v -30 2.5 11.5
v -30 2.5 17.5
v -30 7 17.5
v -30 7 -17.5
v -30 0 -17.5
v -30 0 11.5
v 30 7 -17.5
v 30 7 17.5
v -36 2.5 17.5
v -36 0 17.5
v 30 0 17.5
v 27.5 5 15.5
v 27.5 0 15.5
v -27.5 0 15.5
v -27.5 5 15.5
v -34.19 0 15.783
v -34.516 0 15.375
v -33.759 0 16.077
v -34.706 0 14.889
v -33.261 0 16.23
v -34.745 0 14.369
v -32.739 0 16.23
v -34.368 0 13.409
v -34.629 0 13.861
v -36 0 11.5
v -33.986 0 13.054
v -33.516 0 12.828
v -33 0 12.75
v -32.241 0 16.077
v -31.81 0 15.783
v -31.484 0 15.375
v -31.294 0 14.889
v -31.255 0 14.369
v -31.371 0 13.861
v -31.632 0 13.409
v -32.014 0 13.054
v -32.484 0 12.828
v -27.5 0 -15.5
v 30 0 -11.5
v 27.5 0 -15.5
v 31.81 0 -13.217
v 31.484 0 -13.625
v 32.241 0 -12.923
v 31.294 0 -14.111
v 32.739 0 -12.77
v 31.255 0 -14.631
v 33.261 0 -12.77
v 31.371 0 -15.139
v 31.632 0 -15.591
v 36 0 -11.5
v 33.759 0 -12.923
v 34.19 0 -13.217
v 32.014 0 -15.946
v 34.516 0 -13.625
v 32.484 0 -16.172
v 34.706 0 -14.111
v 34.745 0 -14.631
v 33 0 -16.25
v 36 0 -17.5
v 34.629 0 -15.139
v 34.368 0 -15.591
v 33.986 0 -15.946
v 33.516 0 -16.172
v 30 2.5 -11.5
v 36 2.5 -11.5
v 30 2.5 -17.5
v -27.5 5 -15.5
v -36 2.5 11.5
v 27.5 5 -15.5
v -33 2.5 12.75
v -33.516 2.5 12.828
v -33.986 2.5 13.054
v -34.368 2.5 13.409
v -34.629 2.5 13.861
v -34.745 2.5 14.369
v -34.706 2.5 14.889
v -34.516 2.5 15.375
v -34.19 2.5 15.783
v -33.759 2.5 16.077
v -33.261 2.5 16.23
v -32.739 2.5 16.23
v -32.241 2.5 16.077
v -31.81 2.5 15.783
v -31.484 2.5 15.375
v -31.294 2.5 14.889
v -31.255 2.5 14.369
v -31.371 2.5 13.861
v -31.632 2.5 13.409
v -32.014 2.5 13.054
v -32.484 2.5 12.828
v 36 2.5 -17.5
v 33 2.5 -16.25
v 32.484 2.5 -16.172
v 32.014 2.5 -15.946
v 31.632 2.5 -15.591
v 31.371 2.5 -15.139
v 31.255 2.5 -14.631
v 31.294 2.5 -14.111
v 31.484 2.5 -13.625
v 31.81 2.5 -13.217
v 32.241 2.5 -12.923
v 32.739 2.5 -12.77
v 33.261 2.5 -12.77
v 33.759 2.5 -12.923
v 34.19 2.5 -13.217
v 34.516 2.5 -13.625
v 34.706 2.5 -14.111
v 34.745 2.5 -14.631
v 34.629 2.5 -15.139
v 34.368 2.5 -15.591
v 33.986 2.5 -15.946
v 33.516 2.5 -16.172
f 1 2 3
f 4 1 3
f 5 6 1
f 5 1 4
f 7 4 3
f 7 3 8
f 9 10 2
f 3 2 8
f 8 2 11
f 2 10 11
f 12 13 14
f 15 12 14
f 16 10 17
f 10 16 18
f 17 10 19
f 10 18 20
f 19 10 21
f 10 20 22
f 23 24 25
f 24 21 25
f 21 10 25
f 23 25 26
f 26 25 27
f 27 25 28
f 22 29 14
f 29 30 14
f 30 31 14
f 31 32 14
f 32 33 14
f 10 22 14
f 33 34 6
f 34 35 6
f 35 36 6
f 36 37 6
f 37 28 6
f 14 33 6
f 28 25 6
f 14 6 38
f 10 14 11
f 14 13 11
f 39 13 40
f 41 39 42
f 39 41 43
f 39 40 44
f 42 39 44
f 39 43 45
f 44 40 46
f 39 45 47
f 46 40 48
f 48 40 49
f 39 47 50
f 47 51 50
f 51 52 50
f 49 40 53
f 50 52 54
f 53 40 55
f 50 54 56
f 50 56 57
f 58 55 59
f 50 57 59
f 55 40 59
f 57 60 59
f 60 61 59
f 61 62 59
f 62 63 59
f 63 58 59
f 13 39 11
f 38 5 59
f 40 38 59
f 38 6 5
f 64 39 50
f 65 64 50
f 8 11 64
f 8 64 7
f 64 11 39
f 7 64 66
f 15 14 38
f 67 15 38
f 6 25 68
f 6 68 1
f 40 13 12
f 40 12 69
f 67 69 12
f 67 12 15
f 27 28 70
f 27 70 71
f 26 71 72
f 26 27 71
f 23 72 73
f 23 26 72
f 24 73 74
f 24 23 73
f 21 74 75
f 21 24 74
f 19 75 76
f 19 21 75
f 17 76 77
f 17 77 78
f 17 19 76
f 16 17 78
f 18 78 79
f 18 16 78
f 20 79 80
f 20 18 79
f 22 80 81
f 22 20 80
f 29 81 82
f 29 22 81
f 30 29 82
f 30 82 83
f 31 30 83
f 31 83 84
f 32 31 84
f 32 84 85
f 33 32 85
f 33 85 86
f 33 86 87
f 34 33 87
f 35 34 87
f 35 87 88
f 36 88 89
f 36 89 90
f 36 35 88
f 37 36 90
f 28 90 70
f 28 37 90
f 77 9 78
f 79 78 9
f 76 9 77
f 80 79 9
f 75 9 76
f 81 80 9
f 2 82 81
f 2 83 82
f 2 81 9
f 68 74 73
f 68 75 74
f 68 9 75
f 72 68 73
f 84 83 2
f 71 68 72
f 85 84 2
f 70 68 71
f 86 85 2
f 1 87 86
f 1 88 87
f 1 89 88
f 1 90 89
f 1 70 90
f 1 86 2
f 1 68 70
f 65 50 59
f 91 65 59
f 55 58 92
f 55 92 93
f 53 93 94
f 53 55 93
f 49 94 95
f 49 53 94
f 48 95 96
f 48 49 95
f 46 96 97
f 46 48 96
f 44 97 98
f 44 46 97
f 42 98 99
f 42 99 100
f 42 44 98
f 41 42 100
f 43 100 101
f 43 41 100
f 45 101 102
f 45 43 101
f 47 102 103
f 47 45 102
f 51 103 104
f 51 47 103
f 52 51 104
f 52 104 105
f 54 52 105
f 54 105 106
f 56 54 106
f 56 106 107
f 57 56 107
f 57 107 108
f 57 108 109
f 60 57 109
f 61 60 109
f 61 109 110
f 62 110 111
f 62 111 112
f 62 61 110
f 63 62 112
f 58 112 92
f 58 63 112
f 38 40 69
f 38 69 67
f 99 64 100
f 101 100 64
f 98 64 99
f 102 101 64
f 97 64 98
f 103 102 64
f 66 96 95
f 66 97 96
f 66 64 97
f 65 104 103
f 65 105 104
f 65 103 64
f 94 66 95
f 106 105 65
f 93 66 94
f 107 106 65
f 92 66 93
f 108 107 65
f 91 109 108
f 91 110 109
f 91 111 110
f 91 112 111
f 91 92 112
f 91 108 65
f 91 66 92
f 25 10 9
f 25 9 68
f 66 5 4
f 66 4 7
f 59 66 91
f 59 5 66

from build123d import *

# Parameters (mm, degrees)
SKETCH1_W           = 60
SKETCH1_H           = 35
BOSS_EXTRUDE1_DEPTH = 7
SKETCH3_W           = 6
SKETCH3_H           = 6
SKETCH3_R           = 1.75
BOSS_EXTRUDE2_DEPTH = 2.5
SKETCH4_W           = 55
SKETCH4_H           = 31
CUT_EXTRUDE1_DEPTH  = 5


with BuildPart() as part:
    # Sketch1 → Boss-Extrude1 (new body)
    with BuildSketch(Plane(origin=(0, 0, 0), x_dir=(1, 0, 0), z_dir=(0, 1, 0))):
        Rectangle(SKETCH1_W, SKETCH1_H)
    extrude(amount=BOSS_EXTRUDE1_DEPTH)

    # Sketch3 → Boss-Extrude2 (add)
    with BuildSketch(Plane(origin=(0, 0, 0), x_dir=(1, 0, 0), z_dir=(0, 1, 0))):
        with Locations((-33, -14.5)):
            Rectangle(SKETCH3_W, SKETCH3_H)
        with Locations(Location((-33, -14.5, 0), (0, 0, 90))):  # turned: the seam where the file's is
            Circle(SKETCH3_R, mode=Mode.SUBTRACT)
        with Locations((33, 14.5)):
            Rectangle(SKETCH3_W, SKETCH3_H)
        with Locations(Location((33, 14.5, 0), (0, 0, 90))):  # turned: the seam where the file's is
            Circle(SKETCH3_R, mode=Mode.SUBTRACT)
    extrude(amount=BOSS_EXTRUDE2_DEPTH)

    # Sketch4 → Cut-Extrude1 (cut)
    with BuildSketch(Plane(origin=(0, 0, 0), x_dir=(-1, 0, 0), z_dir=(0, -1, 0))):
        Rectangle(SKETCH4_W, SKETCH4_H)
    extrude(amount=-CUT_EXTRUDE1_DEPTH, mode=Mode.SUBTRACT)


solid = part.part
